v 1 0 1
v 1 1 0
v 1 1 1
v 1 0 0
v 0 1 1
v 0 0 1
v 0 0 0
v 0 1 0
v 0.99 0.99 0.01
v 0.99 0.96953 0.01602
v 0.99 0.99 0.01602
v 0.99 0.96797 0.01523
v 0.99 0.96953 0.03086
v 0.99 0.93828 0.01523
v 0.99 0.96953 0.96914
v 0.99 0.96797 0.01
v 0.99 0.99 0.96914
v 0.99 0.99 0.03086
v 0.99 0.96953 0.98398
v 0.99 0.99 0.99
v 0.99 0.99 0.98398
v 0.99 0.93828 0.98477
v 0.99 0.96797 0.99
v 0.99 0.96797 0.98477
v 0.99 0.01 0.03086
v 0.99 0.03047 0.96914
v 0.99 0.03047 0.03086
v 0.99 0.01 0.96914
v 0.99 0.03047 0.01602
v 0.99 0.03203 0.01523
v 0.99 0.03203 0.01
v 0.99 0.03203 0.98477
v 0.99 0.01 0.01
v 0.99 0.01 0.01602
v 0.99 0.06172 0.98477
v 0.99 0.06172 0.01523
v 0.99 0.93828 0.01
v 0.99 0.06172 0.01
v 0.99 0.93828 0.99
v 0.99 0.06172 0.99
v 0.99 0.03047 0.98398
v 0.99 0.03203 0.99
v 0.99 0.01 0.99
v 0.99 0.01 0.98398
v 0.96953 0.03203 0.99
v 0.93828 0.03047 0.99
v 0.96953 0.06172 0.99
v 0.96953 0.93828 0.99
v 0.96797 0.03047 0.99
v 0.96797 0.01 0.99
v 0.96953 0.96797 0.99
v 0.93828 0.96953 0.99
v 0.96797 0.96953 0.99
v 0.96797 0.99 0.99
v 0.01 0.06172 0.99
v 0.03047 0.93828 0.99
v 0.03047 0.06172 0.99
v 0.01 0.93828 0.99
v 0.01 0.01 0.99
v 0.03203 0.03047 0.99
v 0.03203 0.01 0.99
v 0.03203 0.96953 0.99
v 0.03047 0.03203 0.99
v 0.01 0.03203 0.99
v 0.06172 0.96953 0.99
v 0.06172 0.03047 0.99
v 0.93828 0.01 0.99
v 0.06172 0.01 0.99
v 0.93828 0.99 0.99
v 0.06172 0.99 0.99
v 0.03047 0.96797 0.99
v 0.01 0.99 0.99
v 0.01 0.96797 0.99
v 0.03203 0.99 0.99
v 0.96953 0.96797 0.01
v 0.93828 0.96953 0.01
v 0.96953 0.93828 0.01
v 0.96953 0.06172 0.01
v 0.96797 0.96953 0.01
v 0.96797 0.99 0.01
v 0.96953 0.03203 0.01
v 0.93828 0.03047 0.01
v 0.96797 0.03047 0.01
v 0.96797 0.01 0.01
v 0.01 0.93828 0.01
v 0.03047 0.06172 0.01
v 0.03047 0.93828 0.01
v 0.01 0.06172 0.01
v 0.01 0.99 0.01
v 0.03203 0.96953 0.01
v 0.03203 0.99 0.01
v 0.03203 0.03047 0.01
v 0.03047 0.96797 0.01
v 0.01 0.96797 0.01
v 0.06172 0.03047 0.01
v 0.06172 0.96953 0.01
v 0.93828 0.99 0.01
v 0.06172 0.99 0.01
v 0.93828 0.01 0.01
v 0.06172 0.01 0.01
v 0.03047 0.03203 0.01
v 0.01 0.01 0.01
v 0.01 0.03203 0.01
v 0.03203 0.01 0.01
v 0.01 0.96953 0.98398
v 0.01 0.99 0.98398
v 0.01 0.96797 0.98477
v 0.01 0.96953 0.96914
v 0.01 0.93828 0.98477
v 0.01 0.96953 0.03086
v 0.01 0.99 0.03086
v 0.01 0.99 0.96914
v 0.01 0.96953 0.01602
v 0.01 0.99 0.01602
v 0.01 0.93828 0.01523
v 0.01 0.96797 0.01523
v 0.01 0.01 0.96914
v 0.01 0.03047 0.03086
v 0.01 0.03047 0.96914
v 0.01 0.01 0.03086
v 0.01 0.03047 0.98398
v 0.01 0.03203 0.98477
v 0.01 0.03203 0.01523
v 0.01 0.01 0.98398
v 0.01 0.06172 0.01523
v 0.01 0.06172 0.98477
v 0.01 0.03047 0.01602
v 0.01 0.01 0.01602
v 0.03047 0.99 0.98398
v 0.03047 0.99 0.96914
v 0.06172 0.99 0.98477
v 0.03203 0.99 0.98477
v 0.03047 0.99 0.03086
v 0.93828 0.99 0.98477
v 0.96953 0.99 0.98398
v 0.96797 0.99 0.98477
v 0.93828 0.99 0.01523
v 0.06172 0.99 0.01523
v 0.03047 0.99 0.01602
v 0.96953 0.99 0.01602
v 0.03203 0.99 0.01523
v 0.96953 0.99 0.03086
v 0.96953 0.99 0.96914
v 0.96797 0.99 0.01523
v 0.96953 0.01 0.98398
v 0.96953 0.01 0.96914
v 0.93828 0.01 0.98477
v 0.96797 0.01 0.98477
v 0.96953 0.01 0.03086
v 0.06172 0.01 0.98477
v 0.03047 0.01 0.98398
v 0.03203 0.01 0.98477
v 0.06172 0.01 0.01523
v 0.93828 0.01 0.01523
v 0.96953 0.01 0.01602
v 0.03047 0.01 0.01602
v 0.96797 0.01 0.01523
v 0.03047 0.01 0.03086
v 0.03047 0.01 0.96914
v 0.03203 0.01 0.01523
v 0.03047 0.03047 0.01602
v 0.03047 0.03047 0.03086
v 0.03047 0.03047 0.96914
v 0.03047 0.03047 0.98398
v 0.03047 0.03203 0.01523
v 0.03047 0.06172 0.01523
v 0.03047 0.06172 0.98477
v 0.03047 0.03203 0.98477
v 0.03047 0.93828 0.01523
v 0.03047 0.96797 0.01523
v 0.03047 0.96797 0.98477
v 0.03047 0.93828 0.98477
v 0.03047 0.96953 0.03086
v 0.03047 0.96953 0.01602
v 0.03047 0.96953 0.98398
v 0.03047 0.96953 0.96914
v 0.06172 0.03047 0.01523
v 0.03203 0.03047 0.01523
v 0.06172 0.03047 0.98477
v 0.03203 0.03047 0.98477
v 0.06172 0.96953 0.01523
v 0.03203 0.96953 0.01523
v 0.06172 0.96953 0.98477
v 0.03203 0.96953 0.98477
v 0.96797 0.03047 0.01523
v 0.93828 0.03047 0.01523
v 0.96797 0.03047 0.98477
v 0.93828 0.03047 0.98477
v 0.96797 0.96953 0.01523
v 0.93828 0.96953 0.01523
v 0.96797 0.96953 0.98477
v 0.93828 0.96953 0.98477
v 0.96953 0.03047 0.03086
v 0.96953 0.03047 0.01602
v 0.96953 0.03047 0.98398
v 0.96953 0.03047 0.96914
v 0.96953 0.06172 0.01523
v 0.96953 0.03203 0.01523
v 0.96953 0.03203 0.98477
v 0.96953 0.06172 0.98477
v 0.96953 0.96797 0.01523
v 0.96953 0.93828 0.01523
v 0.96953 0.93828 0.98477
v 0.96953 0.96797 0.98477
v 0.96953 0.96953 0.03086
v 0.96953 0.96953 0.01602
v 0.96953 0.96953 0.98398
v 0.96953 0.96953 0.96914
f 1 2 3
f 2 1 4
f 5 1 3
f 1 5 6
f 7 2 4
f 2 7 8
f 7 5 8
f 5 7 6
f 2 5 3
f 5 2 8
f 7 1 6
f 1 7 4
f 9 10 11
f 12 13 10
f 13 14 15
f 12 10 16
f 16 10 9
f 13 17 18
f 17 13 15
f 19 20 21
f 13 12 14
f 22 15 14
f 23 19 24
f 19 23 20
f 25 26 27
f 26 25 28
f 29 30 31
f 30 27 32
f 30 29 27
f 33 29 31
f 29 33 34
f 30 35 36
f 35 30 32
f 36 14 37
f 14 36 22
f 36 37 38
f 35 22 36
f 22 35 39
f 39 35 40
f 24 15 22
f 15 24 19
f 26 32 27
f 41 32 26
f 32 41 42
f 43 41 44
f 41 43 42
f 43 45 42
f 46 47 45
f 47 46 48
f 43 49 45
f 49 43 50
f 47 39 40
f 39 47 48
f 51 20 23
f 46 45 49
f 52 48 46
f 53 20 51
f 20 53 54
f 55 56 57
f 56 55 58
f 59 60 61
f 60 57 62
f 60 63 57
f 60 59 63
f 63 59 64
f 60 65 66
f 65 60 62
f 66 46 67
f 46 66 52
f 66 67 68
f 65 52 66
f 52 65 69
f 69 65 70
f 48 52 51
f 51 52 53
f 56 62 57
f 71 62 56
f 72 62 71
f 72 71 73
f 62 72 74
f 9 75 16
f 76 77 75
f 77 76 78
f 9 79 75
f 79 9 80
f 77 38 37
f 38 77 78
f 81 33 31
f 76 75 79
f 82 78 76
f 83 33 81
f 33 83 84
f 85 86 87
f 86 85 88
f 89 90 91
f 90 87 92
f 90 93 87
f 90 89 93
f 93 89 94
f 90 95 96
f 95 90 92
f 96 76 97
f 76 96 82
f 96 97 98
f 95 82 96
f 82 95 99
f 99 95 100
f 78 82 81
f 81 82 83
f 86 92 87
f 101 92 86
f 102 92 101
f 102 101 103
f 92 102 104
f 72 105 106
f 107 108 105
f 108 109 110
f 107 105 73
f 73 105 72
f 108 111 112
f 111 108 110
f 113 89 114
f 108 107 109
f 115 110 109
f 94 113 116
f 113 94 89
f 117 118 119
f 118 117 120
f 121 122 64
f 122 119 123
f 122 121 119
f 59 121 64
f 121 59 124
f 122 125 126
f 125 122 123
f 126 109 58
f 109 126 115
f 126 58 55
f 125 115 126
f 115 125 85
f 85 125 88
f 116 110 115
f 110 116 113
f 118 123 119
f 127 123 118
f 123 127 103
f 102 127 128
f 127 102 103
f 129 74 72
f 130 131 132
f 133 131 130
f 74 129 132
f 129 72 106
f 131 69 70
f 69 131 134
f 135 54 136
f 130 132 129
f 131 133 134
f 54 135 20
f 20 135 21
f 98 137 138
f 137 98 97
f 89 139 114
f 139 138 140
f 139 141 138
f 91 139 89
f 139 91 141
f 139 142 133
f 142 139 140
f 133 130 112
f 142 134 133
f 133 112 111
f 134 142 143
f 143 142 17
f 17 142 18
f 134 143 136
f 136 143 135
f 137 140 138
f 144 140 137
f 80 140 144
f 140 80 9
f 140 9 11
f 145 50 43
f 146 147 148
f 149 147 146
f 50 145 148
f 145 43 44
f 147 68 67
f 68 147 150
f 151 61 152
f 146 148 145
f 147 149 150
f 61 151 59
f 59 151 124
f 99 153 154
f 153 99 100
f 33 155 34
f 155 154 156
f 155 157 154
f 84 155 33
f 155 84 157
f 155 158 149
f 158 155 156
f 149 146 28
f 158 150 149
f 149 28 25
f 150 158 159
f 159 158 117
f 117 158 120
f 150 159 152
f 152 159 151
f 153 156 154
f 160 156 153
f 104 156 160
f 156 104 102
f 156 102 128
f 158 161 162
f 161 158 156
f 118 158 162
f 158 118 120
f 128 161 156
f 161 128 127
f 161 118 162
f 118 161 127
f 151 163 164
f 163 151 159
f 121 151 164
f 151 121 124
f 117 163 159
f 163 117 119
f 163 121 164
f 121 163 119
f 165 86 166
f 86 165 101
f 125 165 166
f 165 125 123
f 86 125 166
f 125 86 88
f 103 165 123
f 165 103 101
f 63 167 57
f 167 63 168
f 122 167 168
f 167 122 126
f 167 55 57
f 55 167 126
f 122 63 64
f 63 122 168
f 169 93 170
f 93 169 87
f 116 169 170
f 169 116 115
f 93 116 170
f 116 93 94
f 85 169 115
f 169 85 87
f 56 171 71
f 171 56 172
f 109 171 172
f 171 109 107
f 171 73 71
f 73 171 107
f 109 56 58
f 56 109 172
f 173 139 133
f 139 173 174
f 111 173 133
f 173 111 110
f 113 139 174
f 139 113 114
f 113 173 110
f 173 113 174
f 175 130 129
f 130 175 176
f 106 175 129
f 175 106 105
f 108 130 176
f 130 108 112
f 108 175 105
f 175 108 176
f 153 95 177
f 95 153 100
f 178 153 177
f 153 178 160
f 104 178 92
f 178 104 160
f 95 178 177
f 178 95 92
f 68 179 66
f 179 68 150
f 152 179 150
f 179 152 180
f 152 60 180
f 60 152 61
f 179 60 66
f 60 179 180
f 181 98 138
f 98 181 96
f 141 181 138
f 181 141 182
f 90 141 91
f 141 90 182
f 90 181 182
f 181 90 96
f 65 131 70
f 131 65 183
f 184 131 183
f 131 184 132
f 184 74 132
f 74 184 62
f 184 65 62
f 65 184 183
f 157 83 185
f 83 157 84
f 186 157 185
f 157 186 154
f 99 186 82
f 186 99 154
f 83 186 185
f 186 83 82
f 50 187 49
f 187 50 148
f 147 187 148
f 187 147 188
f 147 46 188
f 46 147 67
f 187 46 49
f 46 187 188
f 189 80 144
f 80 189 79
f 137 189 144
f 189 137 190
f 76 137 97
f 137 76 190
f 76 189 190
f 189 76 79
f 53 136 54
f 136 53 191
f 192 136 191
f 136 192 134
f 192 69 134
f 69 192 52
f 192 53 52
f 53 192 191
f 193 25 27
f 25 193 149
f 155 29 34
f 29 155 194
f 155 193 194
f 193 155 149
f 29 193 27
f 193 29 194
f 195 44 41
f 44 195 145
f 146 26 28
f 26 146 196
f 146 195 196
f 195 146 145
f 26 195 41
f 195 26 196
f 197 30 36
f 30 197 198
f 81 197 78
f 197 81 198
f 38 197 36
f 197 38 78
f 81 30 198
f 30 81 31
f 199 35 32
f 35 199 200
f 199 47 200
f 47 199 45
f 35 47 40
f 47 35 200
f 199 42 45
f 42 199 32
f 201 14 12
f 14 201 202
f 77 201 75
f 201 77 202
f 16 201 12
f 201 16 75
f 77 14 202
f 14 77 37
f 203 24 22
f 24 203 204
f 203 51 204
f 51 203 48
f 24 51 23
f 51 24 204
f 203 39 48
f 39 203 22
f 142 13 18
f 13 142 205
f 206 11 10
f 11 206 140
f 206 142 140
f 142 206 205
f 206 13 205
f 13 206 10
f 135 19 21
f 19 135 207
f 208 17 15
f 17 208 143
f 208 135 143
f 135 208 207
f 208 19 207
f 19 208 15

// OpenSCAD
translate([0.015625, 0.015625, 0.0234375]) color([0.10354984879200568, 0.2709096471593818, 0.14831097974916396]) cube([0.0296875, 0.0296875, 0.01484375], center=true);
translate([0.015625, 0.015625, 0.9765625]) color([0.2857422494656794, 0.13645777115367597, 0.8905045560495195]) cube([0.0296875, 0.0296875, 0.01484375], center=true);
translate([0.015625, 0.046875, 0.0078125]) color([0.20880306319193132, 0.10680944195468256, 0.7469059740977719]) cube([0.0296875, 0.0296875, 0.01484375], center=true);
translate([0.015625, 0.046875, 0.9921875]) color([0.6444739078010406, 0.5447175600963501, 0.3830487554780494]) cube([0.0296875, 0.0296875, 0.01484375], center=true);
translate([0.015625, 0.953125, 0.0078125]) color([0.6213211900091792, 0.141619315195189, 0.11170905142633825]) cube([0.0296875, 0.0296875, 0.01484375], center=true);
translate([0.015625, 0.953125, 0.9921875]) color([0.6956090049553525, 0.9661494425975634, 0.5089696293286363]) cube([0.0296875, 0.0296875, 0.01484375], center=true);
translate([0.015625, 0.984375, 0.0234375]) color([0.0018462255891416035, 0.6573413269849637, 0.6917792227398362]) cube([0.0296875, 0.0296875, 0.01484375], center=true);
translate([0.015625, 0.984375, 0.9765625]) color([0.9430103802949777, 0.17579090439349854, 0.9619824432636994]) cube([0.0296875, 0.0296875, 0.01484375], center=true);
translate([0.046875, 0.015625, 0.0078125]) color([0.57503966455583, 0.5953911443801518, 0.22860052476658776]) cube([0.0296875, 0.0296875, 0.01484375], center=true);
translate([0.046875, 0.015625, 0.9921875]) color([0.3648718451985252, 0.21754952267532923, 0.5392975244659689]) cube([0.0296875, 0.0296875, 0.01484375], center=true);
translate([0.046875, 0.984375, 0.0078125]) color([0.8807907157083095, 0.7721386550354948, 0.16179338016561717]) cube([0.0296875, 0.0296875, 0.01484375], center=true);
translate([0.046875, 0.984375, 0.9921875]) color([0.9688767136268006, 0.035906584868660385, 0.42375188460017876]) cube([0.0296875, 0.0296875, 0.01484375], center=true);
translate([0.953125, 0.015625, 0.0078125]) color([0.05247518032240672, 0.6723304964859157, 0.5088499709917197]) cube([0.0296875, 0.0296875, 0.01484375], center=true);
translate([0.953125, 0.015625, 0.9921875]) color([0.3378959614545314, 0.8322498752637002, 0.024791614851377708]) cube([0.0296875, 0.0296875, 0.01484375], center=true);
translate([0.953125, 0.984375, 0.0078125]) color([0.6960839571088662, 0.6330371967636094, 0.5020427555019221]) cube([0.0296875, 0.0296875, 0.01484375], center=true);
translate([0.953125, 0.984375, 0.9921875]) color([0.561591312448502, 0.8958076015884754, 0.02012477678597846]) cube([0.0296875, 0.0296875, 0.01484375], center=true);
translate([0.984375, 0.015625, 0.0234375]) color([0.007974734958747676, 0.9990255753077658, 0.8521966089827239]) cube([0.0296875, 0.0296875, 0.01484375], center=true);
translate([0.984375, 0.015625, 0.9765625]) color([0.396500333935101, 0.49655111377189787, 0.36678310880969967]) cube([0.0296875, 0.0296875, 0.01484375], center=true);
translate([0.984375, 0.046875, 0.0078125]) color([0.4722789626662123, 0.532619636547877, 0.11903774489805863]) cube([0.0296875, 0.0296875, 0.01484375], center=true);
translate([0.984375, 0.046875, 0.9921875]) color([0.9699021873821313, 0.546362984009982, 0.8441605212068893]) cube([0.0296875, 0.0296875, 0.01484375], center=true);
translate([0.984375, 0.953125, 0.0078125]) color([0.9599631564638731, 0.4610302530313435, 0.7914719349458287]) cube([0.0296875, 0.0296875, 0.01484375], center=true);
translate([0.984375, 0.953125, 0.9921875]) color([0.390465840836155, 0.8028912421336873, 0.9322996232859525]) cube([0.0296875, 0.0296875, 0.01484375], center=true);
translate([0.984375, 0.984375, 0.0234375]) color([0.4833618119730023, 0.04431734544461685, 0.3229151889226197]) cube([0.0296875, 0.0296875, 0.01484375], center=true);
translate([0.984375, 0.984375, 0.9765625]) color([0.8506292329503641, 0.5207973015396478, 0.7406910909125332]) cube([0.0296875, 0.0296875, 0.01484375], center=true);
color([0.3,0.3,0.3,0.3]) difference() { cube([1,1,1]); translate([0.01,0.01,0.01]) cube([0.98,0.98,0.98]); }
